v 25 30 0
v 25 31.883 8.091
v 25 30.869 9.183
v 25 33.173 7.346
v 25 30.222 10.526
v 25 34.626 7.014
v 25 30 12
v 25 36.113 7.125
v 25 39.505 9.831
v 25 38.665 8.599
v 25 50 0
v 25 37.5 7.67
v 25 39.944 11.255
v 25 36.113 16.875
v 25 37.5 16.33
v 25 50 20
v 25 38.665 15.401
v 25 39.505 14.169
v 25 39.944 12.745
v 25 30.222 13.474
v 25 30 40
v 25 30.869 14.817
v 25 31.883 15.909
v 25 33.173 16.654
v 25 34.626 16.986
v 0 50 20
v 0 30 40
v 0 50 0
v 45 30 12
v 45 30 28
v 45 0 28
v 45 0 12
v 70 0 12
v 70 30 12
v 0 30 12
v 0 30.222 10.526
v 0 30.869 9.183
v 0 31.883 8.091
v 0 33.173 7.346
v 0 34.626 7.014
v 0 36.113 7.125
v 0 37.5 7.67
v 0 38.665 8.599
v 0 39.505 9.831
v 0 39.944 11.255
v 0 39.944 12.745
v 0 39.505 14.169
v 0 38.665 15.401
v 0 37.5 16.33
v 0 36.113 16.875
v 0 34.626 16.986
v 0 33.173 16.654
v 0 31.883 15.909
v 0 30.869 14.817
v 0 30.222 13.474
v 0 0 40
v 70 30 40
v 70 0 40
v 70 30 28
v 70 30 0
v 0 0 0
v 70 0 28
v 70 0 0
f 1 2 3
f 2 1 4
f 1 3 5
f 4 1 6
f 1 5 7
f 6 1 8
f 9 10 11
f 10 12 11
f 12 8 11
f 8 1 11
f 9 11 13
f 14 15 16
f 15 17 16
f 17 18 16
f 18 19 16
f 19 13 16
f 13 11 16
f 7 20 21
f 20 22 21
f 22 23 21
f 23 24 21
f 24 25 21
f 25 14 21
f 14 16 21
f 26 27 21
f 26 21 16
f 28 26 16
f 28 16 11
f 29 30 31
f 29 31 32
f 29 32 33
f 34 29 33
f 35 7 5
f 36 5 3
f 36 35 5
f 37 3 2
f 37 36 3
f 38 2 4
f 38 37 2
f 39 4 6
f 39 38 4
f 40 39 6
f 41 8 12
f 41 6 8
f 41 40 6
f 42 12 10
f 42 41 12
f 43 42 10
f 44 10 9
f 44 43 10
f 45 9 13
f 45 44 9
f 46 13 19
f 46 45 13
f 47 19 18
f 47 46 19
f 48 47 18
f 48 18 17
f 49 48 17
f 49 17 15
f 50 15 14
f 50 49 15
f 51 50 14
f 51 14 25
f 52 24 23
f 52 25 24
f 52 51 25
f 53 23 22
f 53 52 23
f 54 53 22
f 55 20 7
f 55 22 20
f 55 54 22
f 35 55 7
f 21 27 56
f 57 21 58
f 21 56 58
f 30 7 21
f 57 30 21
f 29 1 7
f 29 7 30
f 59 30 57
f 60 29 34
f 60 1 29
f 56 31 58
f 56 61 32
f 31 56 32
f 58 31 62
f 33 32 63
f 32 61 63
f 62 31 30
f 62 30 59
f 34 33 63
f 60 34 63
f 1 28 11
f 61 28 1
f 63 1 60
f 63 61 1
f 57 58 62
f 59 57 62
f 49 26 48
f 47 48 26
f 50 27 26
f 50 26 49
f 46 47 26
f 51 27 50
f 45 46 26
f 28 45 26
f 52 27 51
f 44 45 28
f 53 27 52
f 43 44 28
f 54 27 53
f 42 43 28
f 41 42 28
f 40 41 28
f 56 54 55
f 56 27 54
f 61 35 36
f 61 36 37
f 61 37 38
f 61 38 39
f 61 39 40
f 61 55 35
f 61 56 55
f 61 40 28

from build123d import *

# Parameters (mm, degrees)
SKETCH_1_W          = 70
SKETCH_1_H          = 40
EXTRUDE_1_DEPTH     = 30
SKETCH_6_W          = 25
SKETCH_6_H          = 16
CUT_EXTRUDE_2_DEPTH = 87.02325267
EXTRUDE_6_DEPTH     = 25
SKETCH_10_R         = 5
CUT_EXTRUDE_4_DEPTH = 95.868329805


with BuildPart() as part:
    # 草图1 → 凸台-拉伸1 (new body)
    with BuildSketch(Plane(origin=(0, 0, 0), x_dir=(1, 0, 0), z_dir=(0, 1, 0))):
        with Locations((35, -20)):
            Rectangle(SKETCH_1_W, SKETCH_1_H)
    extrude(amount=EXTRUDE_1_DEPTH)

    # 草图6 → 切除-拉伸2 (cut, through all)
    with BuildSketch(Plane(origin=(0, 30, 0), x_dir=(1, 0, 0), z_dir=(0, 1, 0))):
        with Locations((57.5, -20)):
            Rectangle(SKETCH_6_W, SKETCH_6_H)
    extrude(amount=-CUT_EXTRUDE_2_DEPTH, mode=Mode.SUBTRACT)

    # 草图9 → 凸台-拉伸6 (add)
    with BuildSketch(Plane(origin=(0, 0, 0), x_dir=(0, 0, -1), z_dir=(1, 0, 0))):
        Polygon((0, 0), (-40, 0), (-40, 30), (-20, 50), (0, 50), align=None)
    extrude(amount=EXTRUDE_6_DEPTH)

    # 草图10 → 切除-拉伸4 (cut, through all)
    with BuildSketch(Plane(origin=(0, 0, 0), x_dir=(0, 0, -1), z_dir=(1, 0, 0))):
        with Locations(Location((-12, 35, 0), (0, 0, 270))):
            Circle(SKETCH_10_R)
    extrude(amount=CUT_EXTRUDE_4_DEPTH, mode=Mode.SUBTRACT)


solid = part.part
